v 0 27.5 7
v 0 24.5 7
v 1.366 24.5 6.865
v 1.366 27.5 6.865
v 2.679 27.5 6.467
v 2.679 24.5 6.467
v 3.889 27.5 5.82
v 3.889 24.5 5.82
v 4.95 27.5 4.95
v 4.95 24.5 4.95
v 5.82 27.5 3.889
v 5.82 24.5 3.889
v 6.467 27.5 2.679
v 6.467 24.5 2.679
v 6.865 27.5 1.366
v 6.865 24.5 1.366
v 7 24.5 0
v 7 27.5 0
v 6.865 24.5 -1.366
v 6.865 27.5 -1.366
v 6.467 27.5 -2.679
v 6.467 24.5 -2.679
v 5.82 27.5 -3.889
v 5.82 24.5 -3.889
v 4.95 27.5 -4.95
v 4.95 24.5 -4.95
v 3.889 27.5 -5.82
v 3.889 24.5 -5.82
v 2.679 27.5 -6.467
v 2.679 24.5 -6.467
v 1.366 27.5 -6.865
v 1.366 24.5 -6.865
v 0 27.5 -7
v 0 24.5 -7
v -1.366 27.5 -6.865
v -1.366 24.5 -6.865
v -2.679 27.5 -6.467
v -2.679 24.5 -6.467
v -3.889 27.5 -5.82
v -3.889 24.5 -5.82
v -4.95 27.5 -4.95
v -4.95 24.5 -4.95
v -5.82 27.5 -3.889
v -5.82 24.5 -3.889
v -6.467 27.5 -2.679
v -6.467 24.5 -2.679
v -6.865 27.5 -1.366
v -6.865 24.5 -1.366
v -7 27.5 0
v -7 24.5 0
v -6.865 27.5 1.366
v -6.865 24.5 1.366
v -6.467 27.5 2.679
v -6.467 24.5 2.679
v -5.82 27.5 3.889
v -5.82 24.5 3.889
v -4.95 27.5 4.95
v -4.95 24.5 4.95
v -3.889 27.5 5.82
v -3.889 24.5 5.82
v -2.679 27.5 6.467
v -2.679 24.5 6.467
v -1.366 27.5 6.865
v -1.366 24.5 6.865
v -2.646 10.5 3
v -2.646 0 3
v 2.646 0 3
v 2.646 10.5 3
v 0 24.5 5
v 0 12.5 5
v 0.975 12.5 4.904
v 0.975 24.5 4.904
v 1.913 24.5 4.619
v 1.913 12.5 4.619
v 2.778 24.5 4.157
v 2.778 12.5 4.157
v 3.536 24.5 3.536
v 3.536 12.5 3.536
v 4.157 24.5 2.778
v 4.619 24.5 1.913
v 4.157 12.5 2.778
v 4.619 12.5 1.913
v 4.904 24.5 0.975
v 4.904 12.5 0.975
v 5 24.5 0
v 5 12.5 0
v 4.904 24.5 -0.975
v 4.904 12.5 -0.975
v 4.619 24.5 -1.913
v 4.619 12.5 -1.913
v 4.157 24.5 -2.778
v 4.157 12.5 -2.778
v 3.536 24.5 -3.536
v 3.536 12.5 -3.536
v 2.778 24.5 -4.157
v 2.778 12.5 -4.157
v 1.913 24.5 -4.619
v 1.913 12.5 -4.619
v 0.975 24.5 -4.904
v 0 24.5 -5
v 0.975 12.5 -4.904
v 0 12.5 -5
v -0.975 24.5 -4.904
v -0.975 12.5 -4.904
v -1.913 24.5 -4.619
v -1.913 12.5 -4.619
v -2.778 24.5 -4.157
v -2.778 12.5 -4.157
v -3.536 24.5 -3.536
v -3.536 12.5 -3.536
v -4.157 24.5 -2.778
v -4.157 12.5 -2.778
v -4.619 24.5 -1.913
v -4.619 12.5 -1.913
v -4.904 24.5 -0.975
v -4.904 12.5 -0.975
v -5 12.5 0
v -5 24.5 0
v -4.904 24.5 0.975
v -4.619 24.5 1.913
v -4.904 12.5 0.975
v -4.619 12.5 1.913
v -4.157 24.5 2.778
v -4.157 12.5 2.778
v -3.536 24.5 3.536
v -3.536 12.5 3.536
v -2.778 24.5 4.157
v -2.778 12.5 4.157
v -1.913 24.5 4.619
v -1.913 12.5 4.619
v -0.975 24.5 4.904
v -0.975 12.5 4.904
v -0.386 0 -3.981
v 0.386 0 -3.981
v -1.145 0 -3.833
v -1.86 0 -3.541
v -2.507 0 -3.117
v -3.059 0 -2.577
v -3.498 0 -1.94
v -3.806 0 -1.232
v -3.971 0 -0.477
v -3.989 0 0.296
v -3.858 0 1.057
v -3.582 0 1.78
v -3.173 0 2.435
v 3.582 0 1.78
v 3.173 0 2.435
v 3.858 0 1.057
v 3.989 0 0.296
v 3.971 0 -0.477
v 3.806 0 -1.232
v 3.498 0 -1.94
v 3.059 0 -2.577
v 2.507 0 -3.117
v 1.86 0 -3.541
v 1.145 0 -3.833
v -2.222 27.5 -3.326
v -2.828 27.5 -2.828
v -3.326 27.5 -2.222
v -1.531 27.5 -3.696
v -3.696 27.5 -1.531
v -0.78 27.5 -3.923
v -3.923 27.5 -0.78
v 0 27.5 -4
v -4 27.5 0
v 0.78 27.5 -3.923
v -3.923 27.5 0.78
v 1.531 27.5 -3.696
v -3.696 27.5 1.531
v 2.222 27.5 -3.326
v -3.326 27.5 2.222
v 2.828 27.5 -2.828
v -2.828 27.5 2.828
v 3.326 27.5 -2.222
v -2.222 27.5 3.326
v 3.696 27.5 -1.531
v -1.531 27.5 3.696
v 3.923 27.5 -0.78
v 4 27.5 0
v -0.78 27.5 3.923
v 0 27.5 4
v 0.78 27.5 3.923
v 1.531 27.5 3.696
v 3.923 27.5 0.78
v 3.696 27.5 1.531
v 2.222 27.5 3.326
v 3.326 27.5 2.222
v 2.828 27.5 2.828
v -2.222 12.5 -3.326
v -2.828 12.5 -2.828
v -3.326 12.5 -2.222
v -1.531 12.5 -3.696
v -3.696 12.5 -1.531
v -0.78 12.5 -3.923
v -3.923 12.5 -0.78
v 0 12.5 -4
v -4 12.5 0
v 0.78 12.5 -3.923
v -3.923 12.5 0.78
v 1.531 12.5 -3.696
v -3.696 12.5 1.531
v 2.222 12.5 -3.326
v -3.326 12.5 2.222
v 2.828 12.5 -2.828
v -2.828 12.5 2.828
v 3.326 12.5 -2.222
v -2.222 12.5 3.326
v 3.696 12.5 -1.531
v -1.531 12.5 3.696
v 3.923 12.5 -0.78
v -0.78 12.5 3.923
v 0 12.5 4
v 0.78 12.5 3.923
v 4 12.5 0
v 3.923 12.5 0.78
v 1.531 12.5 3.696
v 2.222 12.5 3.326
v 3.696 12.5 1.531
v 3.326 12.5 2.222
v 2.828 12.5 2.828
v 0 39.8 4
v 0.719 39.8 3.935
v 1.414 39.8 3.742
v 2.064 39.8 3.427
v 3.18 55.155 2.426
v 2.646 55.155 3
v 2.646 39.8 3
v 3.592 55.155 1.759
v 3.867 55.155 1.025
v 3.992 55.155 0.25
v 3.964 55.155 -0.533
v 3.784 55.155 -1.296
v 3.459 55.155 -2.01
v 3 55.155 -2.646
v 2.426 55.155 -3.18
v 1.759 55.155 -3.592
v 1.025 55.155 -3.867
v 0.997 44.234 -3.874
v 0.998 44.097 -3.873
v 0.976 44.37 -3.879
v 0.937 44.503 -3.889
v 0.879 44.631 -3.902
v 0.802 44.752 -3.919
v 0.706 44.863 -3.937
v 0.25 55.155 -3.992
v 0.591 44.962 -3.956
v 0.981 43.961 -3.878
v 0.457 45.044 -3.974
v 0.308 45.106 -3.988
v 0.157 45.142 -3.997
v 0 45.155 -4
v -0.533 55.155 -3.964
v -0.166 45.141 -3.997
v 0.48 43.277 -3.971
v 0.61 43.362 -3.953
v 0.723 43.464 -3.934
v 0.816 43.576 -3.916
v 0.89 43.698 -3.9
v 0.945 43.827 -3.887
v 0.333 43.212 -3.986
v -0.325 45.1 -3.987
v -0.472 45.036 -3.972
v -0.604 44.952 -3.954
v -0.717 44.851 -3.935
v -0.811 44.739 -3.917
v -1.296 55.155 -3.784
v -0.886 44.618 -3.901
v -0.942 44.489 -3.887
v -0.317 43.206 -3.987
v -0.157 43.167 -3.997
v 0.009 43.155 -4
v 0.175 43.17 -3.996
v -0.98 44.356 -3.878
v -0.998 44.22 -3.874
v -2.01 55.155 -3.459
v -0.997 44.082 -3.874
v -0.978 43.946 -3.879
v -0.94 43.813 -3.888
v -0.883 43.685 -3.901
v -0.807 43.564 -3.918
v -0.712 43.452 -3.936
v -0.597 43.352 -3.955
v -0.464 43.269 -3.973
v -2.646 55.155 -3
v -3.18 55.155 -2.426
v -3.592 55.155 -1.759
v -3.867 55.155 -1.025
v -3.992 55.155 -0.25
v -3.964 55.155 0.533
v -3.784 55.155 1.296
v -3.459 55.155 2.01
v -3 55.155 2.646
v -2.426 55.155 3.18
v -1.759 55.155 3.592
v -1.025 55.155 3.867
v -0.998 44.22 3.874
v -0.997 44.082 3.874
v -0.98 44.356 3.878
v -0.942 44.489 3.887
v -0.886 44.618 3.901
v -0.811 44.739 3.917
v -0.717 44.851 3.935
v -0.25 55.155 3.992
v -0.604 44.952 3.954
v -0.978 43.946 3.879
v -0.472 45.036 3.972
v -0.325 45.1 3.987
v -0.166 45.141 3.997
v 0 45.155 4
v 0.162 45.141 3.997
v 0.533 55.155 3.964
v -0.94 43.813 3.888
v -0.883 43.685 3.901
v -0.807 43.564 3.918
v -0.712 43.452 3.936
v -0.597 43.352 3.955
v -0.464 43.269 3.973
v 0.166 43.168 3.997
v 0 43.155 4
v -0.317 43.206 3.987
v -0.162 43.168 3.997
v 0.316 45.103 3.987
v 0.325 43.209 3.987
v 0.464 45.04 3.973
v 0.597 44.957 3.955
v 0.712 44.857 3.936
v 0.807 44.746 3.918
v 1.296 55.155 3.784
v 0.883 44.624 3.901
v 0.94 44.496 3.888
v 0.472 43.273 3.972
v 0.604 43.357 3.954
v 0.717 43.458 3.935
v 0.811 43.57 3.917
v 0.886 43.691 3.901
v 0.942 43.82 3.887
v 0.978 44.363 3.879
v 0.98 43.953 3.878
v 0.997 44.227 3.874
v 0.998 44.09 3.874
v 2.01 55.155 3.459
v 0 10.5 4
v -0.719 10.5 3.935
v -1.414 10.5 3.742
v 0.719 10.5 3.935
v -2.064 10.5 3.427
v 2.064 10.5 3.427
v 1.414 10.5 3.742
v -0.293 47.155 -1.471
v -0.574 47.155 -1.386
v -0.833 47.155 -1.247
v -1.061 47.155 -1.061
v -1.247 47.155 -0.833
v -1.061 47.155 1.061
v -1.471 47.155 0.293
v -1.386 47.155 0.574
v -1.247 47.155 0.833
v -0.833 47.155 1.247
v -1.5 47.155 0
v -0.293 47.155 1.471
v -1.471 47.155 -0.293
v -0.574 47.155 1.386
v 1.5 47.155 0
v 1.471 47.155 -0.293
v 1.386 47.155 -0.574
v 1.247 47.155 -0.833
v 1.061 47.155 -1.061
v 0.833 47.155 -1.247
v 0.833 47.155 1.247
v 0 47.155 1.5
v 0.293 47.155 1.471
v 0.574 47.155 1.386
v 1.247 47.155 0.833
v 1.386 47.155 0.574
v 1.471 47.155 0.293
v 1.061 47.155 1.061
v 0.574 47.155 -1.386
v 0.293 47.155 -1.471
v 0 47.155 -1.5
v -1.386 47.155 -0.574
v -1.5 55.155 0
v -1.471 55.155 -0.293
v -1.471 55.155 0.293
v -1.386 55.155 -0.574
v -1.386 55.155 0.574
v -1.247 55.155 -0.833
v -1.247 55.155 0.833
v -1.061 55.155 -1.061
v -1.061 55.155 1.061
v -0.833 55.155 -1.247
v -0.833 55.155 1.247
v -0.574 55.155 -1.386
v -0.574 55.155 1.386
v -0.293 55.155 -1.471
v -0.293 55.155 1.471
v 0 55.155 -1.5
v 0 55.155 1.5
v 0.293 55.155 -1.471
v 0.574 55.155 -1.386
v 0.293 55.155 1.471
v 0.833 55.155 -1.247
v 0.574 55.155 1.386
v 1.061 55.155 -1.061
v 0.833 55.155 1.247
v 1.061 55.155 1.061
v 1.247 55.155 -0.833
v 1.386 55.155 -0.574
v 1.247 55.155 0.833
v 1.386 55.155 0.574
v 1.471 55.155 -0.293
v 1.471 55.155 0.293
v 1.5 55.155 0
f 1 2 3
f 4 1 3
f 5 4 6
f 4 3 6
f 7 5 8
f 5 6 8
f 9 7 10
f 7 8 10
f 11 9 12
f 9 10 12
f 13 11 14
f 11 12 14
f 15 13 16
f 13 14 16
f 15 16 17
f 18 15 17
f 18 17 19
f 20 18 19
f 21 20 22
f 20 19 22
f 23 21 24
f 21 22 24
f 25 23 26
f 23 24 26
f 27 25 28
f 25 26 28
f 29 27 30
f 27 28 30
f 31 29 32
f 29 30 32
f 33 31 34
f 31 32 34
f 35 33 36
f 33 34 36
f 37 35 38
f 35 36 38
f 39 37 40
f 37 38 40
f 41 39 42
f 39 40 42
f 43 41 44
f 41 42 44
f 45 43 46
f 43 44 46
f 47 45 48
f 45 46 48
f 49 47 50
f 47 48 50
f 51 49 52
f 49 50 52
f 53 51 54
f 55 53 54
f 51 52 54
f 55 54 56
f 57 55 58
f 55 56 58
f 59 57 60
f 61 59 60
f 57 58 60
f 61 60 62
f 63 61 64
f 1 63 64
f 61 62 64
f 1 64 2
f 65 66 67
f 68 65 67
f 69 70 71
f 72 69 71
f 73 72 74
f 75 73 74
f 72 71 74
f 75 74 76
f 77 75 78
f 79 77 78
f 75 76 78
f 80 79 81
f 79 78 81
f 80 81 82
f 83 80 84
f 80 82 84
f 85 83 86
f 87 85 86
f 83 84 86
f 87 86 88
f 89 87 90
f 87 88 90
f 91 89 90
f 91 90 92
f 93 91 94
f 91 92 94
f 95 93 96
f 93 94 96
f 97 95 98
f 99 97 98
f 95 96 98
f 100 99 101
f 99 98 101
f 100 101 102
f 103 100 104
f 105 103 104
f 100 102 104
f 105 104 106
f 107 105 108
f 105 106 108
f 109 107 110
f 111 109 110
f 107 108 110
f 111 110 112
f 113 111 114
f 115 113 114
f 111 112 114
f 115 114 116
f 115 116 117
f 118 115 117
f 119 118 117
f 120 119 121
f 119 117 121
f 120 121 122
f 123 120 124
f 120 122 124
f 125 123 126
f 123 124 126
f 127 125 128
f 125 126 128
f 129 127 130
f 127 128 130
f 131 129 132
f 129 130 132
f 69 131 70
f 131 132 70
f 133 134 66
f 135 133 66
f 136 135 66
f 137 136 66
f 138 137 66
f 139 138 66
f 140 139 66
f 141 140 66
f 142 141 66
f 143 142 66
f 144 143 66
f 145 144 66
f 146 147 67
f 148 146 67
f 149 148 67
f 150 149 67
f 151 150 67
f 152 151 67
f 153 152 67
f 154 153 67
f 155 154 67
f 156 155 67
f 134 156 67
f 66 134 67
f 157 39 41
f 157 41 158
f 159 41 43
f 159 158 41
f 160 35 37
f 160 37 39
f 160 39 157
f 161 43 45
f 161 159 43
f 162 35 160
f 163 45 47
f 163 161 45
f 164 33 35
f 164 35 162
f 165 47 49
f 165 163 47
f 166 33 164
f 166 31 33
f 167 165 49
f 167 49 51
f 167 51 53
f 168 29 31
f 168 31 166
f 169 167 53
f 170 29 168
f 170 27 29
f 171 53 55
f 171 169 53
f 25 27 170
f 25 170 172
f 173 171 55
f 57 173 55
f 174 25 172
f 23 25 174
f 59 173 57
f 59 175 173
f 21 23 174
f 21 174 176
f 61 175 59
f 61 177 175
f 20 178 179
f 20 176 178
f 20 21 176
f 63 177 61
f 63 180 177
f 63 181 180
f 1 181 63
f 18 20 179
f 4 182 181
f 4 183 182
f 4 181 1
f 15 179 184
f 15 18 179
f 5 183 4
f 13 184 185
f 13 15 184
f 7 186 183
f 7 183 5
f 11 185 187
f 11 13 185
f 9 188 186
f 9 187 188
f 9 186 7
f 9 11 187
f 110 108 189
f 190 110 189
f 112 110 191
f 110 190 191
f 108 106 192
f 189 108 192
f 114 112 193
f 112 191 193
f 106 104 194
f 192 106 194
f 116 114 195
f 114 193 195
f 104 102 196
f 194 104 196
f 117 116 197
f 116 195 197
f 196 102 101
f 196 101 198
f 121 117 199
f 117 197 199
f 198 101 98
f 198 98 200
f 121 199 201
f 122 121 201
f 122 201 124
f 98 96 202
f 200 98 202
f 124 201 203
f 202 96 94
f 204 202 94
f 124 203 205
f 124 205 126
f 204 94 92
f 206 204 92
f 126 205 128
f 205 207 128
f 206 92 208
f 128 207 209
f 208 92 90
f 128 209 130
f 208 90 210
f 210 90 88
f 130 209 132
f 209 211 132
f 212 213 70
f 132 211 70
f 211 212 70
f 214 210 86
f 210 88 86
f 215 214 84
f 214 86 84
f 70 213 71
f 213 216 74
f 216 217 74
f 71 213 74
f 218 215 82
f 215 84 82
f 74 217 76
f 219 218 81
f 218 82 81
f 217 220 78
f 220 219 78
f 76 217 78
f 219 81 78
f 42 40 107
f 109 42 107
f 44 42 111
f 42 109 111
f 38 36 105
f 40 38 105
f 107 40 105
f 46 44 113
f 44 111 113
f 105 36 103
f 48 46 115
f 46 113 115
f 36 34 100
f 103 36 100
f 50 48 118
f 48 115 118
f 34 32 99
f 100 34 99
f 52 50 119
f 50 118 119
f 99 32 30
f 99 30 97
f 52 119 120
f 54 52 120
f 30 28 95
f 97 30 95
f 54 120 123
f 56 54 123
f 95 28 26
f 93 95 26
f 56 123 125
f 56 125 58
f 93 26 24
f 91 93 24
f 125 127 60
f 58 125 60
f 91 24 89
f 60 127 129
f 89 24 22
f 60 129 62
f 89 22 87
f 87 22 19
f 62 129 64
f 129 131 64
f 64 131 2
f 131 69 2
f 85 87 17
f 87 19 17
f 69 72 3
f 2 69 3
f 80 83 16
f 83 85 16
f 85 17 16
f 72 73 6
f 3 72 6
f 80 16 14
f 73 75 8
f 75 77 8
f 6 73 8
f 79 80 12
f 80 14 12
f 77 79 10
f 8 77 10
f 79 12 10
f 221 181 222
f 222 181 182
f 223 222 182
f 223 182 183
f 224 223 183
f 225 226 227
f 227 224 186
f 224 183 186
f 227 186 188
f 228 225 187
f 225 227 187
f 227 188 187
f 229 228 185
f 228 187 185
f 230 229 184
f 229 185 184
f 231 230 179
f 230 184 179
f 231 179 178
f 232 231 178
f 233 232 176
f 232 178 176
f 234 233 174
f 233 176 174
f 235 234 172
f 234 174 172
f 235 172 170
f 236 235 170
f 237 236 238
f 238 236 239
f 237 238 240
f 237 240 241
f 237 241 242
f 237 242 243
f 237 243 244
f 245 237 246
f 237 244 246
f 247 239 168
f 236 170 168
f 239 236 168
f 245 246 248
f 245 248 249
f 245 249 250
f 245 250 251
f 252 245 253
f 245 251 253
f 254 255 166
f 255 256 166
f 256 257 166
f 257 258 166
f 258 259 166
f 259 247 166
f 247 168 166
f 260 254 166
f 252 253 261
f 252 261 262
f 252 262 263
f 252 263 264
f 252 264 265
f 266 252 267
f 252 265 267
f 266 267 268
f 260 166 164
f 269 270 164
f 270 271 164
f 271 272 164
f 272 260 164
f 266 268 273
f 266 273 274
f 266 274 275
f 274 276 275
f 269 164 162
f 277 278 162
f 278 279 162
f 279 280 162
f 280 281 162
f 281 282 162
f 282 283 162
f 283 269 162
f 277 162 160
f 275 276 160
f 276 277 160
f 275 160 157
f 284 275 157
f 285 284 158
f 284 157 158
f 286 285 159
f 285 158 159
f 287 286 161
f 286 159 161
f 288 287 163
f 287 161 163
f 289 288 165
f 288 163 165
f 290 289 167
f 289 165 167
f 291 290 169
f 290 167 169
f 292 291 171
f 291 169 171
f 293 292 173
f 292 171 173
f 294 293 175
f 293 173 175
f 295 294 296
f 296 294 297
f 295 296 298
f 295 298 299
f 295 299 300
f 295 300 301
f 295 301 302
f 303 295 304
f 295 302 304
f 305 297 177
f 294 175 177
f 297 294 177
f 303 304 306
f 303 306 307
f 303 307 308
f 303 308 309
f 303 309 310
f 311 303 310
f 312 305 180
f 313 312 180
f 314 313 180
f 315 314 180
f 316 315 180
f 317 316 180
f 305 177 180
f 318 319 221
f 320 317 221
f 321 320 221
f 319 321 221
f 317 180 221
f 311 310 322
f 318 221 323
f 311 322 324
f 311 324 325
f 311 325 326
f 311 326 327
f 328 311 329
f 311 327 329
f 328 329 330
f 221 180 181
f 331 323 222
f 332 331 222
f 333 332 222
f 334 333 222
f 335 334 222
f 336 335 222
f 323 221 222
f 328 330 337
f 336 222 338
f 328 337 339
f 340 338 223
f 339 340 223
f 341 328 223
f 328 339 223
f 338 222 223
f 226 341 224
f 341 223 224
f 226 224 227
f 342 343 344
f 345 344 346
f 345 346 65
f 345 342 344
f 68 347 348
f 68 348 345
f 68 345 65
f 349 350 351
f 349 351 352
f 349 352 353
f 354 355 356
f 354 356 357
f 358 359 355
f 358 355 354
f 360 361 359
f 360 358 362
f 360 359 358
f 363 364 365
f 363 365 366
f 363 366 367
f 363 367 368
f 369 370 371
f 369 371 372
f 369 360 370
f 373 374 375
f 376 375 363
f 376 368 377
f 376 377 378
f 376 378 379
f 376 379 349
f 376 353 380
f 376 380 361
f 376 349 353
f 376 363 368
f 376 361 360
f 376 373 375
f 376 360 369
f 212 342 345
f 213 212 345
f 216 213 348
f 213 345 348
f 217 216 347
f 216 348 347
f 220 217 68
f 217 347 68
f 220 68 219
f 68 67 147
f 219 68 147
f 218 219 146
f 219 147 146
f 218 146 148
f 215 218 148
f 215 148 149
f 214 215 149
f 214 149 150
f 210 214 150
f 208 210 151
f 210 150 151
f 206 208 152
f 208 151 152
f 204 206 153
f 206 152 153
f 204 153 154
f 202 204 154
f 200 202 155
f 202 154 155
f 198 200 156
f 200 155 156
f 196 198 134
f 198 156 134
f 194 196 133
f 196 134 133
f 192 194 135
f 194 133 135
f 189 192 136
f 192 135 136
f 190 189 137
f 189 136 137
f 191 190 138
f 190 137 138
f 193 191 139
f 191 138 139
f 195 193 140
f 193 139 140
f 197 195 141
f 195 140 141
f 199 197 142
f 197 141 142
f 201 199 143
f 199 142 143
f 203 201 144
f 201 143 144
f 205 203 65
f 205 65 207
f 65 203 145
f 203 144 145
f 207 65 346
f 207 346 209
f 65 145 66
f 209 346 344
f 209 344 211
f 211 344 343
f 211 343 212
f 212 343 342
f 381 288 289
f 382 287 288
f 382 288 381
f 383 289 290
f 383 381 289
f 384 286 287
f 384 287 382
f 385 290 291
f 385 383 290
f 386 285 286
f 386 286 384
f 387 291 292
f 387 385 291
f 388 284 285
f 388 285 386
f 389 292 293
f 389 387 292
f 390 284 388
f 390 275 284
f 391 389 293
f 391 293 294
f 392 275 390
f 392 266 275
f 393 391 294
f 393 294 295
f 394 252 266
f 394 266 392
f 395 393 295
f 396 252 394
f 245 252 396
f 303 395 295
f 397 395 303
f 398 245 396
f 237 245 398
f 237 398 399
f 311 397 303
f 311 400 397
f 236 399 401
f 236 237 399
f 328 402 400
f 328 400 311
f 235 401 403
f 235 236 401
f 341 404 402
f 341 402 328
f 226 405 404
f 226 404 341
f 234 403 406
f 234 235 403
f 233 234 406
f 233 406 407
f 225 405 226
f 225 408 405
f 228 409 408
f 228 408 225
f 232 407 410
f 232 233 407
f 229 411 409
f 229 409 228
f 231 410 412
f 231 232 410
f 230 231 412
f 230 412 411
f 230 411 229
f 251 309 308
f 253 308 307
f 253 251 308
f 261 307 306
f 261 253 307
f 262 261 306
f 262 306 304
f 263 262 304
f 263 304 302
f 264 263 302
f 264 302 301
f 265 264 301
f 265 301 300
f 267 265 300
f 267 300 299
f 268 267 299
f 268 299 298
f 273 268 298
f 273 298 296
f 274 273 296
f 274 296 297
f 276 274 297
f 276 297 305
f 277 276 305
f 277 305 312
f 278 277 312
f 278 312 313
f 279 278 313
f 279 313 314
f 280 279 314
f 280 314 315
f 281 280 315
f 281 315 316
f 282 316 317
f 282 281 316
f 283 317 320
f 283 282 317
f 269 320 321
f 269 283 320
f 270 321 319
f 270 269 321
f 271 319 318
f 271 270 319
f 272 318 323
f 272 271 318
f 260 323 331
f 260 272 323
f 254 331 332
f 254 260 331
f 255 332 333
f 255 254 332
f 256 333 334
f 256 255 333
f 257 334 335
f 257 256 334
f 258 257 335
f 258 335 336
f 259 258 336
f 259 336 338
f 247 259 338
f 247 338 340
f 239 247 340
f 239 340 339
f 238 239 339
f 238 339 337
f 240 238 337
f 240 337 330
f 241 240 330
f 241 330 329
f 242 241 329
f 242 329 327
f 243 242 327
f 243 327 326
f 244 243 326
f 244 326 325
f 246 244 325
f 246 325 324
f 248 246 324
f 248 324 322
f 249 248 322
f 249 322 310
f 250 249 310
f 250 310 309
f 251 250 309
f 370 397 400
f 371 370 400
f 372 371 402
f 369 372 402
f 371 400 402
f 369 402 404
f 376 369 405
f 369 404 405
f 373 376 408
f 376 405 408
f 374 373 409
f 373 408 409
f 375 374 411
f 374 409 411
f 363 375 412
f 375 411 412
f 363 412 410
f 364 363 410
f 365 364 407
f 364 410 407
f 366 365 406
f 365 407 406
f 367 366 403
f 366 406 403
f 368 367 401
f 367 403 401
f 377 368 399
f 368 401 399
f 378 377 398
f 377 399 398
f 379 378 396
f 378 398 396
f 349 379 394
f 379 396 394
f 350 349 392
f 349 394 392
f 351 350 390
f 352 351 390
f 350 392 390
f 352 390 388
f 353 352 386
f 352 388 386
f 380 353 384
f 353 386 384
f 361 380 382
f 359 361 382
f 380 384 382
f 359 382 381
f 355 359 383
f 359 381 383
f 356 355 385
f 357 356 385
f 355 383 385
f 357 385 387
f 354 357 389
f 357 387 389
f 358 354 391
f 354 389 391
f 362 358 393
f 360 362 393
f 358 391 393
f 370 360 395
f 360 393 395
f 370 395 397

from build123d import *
from build123d.topology import SkipClean

# Parameters (mm, degrees)
SKETCH1_R                    = 4
COUPLER_SECTION_DEPTH        = 12.5
SKETCH3_R                    = 5
BEARING_SECTION_DEPTH        = 12
SKETCH4_R                    = 7
BEARING_STOP_DEPTH           = 3
SKETCH5_R                    = 4
SMALL_SEAL_SECTION_DEPTH     = 12.3
SET_SCREW_FLAT_SECTION_DEPTH = 10.5
SKETCH7_R                    = 4
IMPELLER_SECTION_DEPTH       = 15.35455
SKETCH8_R                    = 1.5
IMPELLER_BOLT_BORE_DEPTH     = 8
DOWEL_PIN_HOLE_DEPTH         = 23
DOWEL_PIN_HOLE_DEPTH_BACK    = 23
SKETCH9_R                    = 1


with BuildPart() as part:
    # Sketch1 → coupler section (new body)
    with BuildSketch(Plane(origin=(0, 0, 0), x_dir=(1, 0, 0), z_dir=(0, 1, 0))):
        with Locations(Location((0, 0, 0), (0, 0, 270))):
            Circle(SKETCH1_R)
    extrude(amount=COUPLER_SECTION_DEPTH)

    # Sketch3 → bearing section (add)
    with BuildSketch(Plane(origin=(0, 12.5, 0), x_dir=(1, 0, 0), z_dir=(0, 1, 0))):
        with Locations(Location((0, 0, 0), (0, 0, 270))):
            Circle(SKETCH3_R)
    extrude(amount=BEARING_SECTION_DEPTH)

    # Sketch4 → bearing stop (add)
    with BuildSketch(Plane(origin=(0, 24.5, 0), x_dir=(1, 0, 0), z_dir=(0, 1, 0))):
        with Locations(Location((0, 0, 0), (0, 0, 270))):
            Circle(SKETCH4_R)
    extrude(amount=BEARING_STOP_DEPTH)

    # Sketch5 → small seal section (add)
    with BuildSketch(Plane(origin=(0, 27.5, 0), x_dir=(1, 0, 0), z_dir=(0, 1, 0))):
        with Locations(Location((0, 0, 0), (0, 0, 270))):
            Circle(SKETCH5_R)
    extrude(amount=SMALL_SEAL_SECTION_DEPTH)

    # Sketch6 → set screw flat section (cut)
    with BuildSketch(Plane.XZ):
        with BuildLine():
            Line((-2.645751311, 3), (2.645751311, 3))
            ThreePointArc((2.645751311, 3), (0, 4), (-2.645751311, 3))
        make_face()
    extrude(amount=-SET_SCREW_FLAT_SECTION_DEPTH, mode=Mode.SUBTRACT)

    # Sketch7 → impeller section (add)
    with BuildSketch(Plane(origin=(0, 39.8, 0), x_dir=(1, 0, 0), z_dir=(0, 1, 0))):
        with Locations(Location((0, 0, 0), (0, 0, 311.409622109))):
            Circle(SKETCH7_R)
    extrude(amount=IMPELLER_SECTION_DEPTH)

    # Sketch8 → impeller bolt bore (cut)
    with BuildSketch(Plane(origin=(0, 55.15455, 0), x_dir=(1, 0, 0), z_dir=(0, 1, 0))):
        with Locations(Location((0, 0, 0), (0, 0, 270))):
            Circle(SKETCH8_R)
    extrude(amount=-IMPELLER_BOLT_BORE_DEPTH, mode=Mode.SUBTRACT)

    # Sketch9 → dowel pin hole (cut, two sides: drawn at the far end of the back side and taken through both)
    with SkipClean():  # the faces are left unmerged after this step: merging them gives an invalid solid
        with BuildSketch(Plane.XY.offset(-DOWEL_PIN_HOLE_DEPTH_BACK)):
            with Locations(Location((0, 44.15455, 0), (0, 0, 89.999999996))):
                Circle(SKETCH9_R)
        extrude(amount=DOWEL_PIN_HOLE_DEPTH + DOWEL_PIN_HOLE_DEPTH_BACK, mode=Mode.SUBTRACT)


solid = part.part
